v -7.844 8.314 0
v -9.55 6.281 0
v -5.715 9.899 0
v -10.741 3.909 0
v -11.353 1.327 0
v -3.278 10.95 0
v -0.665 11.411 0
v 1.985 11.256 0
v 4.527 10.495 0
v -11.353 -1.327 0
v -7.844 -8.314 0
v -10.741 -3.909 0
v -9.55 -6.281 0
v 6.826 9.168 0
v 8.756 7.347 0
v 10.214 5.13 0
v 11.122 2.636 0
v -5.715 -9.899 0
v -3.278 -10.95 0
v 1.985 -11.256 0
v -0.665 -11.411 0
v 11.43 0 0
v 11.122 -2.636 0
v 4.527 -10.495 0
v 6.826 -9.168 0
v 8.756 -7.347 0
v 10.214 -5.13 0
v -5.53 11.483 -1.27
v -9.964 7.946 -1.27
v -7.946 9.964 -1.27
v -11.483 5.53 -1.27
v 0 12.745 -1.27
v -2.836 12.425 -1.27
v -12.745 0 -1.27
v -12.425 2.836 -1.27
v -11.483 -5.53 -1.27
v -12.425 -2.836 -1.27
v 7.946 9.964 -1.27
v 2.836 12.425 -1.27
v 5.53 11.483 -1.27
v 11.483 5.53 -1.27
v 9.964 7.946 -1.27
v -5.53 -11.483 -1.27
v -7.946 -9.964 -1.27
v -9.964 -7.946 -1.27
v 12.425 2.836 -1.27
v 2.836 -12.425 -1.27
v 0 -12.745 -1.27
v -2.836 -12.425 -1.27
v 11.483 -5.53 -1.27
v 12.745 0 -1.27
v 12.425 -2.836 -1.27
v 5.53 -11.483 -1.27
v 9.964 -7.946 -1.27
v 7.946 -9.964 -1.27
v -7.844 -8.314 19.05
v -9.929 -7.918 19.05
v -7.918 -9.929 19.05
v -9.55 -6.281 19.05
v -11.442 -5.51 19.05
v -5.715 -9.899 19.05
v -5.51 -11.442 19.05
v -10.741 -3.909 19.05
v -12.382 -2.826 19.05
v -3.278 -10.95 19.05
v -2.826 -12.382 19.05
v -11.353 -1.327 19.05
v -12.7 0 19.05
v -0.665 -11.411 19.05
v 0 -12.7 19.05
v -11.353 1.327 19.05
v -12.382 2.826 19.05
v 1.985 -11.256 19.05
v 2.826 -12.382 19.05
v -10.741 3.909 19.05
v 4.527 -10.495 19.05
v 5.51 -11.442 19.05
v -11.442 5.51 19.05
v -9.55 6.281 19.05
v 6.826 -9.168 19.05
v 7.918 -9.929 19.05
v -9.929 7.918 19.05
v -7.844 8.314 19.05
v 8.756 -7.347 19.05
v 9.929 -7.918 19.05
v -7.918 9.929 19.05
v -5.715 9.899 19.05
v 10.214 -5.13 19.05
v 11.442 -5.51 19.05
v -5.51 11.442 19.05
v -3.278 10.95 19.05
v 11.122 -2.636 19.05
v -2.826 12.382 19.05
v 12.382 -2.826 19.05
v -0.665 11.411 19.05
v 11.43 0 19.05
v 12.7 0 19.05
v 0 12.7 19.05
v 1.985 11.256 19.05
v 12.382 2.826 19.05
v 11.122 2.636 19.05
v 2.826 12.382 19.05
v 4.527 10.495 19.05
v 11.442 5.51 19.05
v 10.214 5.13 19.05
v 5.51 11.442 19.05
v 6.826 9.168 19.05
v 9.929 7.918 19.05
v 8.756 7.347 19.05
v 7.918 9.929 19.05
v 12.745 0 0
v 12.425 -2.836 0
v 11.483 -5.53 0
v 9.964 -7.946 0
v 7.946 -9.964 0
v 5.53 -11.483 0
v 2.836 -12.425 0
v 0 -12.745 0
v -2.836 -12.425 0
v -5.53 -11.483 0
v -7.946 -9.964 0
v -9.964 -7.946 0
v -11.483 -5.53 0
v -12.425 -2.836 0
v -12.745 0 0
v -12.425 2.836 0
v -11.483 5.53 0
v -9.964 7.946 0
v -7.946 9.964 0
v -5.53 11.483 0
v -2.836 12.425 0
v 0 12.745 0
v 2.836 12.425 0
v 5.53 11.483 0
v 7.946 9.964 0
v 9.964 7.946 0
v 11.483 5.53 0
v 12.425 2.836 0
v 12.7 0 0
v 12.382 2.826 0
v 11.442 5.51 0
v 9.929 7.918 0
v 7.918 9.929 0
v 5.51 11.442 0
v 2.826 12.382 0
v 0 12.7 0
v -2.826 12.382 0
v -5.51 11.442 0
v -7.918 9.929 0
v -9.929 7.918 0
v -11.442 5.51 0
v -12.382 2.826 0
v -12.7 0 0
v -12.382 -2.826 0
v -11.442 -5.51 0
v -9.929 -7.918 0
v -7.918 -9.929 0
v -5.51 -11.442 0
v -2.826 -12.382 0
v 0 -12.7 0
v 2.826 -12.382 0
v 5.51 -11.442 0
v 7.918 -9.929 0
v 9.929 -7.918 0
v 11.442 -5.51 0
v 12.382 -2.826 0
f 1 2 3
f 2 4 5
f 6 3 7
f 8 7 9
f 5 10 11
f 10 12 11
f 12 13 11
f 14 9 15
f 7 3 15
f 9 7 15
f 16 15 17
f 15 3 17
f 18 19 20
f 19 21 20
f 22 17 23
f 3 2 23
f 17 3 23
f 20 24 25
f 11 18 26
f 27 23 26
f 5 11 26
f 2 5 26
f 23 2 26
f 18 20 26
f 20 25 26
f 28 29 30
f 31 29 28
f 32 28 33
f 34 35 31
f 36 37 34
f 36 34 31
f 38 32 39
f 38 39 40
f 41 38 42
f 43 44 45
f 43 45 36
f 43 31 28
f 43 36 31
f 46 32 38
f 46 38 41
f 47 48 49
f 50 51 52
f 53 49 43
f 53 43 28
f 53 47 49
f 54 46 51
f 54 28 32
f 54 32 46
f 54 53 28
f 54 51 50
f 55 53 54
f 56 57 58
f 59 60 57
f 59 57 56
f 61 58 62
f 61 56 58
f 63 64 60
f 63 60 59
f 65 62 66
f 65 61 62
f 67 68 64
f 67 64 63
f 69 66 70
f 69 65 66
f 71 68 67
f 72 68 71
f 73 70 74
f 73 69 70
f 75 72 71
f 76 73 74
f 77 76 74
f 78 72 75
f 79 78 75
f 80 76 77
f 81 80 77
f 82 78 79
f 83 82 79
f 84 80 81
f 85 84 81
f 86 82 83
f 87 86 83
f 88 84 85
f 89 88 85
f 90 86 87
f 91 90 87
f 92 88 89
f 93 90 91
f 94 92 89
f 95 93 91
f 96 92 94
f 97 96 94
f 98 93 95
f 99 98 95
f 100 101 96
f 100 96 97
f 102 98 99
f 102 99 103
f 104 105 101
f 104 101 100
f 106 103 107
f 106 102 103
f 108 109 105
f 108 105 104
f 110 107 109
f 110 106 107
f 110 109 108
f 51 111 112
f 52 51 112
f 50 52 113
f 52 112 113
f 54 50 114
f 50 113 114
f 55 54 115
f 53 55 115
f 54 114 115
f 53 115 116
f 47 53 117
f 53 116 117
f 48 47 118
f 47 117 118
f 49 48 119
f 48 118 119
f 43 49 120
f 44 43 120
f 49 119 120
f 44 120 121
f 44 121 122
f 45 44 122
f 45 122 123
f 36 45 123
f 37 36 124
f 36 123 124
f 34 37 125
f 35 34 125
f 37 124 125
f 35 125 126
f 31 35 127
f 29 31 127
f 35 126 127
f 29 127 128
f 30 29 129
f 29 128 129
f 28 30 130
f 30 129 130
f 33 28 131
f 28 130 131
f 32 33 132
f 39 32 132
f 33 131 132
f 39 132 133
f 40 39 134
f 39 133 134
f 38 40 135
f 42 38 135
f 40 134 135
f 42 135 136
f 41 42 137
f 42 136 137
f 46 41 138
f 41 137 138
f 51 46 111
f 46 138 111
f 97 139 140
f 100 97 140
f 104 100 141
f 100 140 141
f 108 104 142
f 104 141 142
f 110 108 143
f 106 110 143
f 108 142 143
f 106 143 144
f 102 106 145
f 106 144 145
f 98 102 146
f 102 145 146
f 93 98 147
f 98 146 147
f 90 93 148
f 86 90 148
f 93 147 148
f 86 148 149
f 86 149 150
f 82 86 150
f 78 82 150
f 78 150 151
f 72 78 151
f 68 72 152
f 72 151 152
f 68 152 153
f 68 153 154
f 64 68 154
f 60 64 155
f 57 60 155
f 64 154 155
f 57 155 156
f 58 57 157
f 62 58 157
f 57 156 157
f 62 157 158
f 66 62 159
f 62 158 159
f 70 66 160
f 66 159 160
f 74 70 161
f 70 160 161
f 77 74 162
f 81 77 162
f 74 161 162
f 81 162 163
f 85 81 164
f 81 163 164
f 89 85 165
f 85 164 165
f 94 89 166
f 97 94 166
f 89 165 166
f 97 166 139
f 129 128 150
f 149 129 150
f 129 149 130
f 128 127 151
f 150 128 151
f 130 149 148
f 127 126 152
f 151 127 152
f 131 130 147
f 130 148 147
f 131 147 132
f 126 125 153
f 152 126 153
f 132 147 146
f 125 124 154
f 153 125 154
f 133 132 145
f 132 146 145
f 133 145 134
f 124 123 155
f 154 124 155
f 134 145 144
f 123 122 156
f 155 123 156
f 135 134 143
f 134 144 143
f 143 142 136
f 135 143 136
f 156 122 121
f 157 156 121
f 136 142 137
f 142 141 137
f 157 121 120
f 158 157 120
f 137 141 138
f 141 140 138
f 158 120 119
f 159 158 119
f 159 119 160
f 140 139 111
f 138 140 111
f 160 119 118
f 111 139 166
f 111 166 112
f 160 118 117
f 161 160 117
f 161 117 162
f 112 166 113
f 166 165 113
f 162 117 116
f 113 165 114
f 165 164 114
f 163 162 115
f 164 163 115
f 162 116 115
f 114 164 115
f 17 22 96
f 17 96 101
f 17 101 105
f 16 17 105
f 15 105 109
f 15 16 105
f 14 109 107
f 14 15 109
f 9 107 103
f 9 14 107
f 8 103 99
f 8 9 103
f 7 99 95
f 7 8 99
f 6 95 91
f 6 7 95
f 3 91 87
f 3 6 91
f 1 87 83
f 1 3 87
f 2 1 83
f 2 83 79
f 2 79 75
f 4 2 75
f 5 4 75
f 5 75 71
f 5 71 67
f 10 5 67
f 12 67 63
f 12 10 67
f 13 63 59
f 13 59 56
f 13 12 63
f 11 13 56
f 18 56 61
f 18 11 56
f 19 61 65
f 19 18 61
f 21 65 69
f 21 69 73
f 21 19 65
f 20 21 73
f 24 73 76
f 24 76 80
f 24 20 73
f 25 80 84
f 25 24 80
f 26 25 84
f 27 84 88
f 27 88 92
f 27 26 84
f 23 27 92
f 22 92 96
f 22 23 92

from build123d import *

# Parameters (mm, degrees)
F0_R     = 12.7
F0_R_2   = 11.43
F1_DEPTH = 19.05
F2_R     = 12.744954
F3_DEPTH = 1.27


with BuildPart() as f1:
    # F0 (on Top) → F1 (new body)
    with BuildSketch(Plane.XY):
        Circle(F0_R)
        Circle(F0_R_2, mode=Mode.SUBTRACT)
    extrude(amount=F1_DEPTH)

    # F2 (on face) → F3 (join)
    with BuildSketch(Plane(origin=(0, 0, 0), x_dir=(1, 0, 0), z_dir=(0, 0, -1))):
        Circle(F2_R)
    extrude(amount=F3_DEPTH)


solid = f1.part
